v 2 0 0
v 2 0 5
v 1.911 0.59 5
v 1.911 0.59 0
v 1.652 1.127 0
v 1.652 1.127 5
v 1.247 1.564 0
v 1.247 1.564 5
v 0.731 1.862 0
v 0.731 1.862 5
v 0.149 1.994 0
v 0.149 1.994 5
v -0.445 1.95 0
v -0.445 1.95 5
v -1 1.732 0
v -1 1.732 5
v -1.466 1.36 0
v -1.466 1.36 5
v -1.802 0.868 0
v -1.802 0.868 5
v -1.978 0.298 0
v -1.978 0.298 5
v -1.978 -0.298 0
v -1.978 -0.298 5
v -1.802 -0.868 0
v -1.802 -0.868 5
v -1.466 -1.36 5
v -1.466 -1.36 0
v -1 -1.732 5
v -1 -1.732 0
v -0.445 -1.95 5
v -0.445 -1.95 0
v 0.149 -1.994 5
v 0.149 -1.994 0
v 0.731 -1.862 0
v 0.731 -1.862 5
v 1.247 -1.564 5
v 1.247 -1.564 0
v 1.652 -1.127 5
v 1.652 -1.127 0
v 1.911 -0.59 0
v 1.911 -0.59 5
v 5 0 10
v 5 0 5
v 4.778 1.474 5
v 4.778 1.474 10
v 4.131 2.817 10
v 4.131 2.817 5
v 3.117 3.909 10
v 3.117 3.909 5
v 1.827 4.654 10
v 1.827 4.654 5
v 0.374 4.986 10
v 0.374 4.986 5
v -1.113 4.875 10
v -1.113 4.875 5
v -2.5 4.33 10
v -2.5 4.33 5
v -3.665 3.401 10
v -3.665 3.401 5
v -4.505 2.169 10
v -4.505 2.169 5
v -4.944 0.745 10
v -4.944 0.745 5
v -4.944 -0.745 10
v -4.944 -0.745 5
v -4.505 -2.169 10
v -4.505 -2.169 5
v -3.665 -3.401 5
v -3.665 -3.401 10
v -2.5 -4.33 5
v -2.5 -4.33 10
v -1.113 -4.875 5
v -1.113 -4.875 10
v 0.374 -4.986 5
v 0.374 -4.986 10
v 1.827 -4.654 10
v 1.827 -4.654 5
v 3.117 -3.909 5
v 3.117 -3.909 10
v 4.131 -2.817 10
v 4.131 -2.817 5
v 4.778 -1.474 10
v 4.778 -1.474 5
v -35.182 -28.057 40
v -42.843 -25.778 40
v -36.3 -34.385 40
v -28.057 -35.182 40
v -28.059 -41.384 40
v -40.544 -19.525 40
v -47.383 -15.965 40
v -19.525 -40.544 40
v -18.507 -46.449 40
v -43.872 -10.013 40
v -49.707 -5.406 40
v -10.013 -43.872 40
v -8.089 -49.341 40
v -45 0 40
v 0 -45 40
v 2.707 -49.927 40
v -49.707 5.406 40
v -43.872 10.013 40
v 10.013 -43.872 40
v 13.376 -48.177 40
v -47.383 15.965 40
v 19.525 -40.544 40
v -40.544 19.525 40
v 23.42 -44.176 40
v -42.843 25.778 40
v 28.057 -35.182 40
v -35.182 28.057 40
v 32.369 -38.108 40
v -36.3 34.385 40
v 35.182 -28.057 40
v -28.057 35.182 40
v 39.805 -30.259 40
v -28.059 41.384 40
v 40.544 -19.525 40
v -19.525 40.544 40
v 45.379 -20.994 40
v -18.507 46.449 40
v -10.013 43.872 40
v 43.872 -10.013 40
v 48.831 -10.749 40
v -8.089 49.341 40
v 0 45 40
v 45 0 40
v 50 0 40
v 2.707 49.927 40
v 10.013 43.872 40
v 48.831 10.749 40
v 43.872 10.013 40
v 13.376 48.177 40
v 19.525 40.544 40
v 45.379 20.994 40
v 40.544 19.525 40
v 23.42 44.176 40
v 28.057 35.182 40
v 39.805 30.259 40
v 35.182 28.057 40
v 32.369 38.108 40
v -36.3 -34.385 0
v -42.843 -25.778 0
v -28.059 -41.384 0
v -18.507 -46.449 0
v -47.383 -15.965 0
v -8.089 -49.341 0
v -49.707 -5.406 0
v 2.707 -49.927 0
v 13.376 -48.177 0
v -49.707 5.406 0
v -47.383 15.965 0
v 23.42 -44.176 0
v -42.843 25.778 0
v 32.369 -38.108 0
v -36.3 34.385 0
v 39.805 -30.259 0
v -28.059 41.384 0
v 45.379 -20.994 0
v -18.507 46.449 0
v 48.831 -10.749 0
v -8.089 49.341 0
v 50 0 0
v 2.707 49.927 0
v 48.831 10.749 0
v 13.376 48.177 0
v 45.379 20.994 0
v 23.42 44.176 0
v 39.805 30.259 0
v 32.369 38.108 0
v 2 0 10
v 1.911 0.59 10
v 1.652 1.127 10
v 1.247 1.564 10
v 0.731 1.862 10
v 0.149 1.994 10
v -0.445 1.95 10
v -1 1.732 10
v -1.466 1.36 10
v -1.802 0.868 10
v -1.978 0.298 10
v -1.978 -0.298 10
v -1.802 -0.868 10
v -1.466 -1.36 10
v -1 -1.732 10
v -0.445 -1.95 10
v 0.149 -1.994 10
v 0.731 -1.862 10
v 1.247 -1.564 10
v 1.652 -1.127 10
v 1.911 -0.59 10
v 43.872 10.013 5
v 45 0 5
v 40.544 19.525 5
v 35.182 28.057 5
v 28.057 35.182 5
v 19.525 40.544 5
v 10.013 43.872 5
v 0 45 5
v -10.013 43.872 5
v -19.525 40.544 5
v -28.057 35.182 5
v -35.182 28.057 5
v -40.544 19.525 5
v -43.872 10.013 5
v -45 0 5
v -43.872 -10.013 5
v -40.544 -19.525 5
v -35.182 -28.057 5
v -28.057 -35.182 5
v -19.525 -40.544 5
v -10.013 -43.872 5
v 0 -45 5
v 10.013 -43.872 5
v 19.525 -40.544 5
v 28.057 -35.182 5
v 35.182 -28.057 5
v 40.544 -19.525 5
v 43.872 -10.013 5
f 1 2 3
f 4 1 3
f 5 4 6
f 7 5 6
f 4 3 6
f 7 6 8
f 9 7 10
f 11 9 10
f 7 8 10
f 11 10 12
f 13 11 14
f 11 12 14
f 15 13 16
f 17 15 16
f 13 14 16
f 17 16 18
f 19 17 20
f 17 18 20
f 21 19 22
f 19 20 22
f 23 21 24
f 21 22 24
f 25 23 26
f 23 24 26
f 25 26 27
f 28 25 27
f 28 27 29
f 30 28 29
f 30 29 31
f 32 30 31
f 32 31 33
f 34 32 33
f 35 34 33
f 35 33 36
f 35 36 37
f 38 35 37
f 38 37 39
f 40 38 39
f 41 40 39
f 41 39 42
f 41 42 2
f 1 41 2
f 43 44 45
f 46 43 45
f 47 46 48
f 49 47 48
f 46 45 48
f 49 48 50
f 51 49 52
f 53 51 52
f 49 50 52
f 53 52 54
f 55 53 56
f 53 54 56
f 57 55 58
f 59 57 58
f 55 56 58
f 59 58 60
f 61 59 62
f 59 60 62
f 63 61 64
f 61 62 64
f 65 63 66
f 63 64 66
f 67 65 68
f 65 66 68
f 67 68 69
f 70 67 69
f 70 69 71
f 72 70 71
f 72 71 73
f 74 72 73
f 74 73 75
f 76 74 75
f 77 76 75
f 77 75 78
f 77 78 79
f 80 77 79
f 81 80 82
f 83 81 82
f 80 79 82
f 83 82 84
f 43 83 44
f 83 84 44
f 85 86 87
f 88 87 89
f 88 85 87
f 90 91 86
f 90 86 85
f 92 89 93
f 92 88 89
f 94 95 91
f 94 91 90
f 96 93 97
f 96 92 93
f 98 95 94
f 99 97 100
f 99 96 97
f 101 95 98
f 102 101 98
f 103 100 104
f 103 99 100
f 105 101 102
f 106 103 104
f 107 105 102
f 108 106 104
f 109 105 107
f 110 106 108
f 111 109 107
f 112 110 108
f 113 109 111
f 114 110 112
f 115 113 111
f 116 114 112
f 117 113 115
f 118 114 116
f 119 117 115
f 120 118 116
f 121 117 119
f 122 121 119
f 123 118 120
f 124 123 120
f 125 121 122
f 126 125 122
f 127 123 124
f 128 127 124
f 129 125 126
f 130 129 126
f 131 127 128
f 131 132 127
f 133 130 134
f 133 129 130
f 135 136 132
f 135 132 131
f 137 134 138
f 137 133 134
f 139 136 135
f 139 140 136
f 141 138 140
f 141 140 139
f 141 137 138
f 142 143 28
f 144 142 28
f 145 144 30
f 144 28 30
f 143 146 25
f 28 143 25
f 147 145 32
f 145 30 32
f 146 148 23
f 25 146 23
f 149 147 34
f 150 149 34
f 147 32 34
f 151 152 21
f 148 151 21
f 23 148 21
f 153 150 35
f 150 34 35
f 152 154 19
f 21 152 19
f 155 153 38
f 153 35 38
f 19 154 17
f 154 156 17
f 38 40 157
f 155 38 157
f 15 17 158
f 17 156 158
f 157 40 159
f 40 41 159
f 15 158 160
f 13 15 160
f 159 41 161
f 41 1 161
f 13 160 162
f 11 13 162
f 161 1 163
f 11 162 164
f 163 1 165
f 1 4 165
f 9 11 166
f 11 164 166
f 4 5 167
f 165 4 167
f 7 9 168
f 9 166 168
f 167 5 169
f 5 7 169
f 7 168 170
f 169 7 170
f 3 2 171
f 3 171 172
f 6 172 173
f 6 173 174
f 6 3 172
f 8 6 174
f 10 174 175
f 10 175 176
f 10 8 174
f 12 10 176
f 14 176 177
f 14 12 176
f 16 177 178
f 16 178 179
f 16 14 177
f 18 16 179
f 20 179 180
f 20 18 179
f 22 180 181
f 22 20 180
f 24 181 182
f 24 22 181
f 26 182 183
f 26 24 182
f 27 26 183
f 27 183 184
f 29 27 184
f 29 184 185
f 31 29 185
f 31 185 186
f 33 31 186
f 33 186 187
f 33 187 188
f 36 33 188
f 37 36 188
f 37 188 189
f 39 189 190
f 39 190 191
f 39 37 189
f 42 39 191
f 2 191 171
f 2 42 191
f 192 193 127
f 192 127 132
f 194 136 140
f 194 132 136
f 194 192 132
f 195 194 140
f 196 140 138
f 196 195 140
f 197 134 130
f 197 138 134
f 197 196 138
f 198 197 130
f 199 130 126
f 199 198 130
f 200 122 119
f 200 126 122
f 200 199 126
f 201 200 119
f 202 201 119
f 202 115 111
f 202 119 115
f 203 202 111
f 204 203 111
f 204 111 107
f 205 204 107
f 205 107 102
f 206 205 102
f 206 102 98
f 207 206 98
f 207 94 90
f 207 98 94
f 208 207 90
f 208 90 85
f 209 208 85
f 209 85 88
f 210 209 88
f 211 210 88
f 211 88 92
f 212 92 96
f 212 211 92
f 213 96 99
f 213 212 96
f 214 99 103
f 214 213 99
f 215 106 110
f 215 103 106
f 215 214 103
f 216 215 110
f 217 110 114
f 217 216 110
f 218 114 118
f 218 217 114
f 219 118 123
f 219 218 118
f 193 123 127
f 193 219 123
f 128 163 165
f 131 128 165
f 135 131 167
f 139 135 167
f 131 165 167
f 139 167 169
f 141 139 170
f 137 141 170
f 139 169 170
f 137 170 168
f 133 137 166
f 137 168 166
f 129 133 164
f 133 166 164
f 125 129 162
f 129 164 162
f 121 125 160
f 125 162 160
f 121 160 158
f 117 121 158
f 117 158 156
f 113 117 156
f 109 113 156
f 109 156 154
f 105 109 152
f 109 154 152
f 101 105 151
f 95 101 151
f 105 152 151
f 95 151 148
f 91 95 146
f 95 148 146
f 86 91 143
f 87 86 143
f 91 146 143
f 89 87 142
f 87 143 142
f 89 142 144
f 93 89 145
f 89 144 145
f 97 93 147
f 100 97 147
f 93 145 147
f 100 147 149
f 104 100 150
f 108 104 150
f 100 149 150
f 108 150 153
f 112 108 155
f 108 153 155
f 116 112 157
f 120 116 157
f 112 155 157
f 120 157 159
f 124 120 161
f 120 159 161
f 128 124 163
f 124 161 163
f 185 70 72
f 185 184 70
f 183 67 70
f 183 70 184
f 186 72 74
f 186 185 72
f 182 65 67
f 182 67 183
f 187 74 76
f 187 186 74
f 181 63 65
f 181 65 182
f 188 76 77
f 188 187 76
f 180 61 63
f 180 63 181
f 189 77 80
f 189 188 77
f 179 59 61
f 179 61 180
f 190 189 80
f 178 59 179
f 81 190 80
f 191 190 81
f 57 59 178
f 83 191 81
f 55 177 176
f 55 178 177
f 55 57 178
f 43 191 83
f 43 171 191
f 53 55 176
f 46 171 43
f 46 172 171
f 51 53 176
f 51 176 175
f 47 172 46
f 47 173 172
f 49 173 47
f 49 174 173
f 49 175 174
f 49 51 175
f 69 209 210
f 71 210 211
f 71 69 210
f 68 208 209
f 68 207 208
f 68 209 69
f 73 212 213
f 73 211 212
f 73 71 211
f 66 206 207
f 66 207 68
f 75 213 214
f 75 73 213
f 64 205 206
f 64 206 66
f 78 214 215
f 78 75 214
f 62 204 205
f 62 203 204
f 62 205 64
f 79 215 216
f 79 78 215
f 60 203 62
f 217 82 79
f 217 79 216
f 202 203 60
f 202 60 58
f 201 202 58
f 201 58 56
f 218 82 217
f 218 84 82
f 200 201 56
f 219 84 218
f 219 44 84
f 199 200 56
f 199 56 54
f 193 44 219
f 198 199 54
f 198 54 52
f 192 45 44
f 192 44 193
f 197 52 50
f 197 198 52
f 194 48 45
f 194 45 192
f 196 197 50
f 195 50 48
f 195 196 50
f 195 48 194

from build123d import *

# Parameters (mm, degrees)
SKETCH1_R               = 50
BOSS_EXTRUDE1_DEPTH     = 40
SHELL1_T                = -5
SKETCH2_R               = 2
CUT_EXTRUDE1_DEPTH      = 79.89866919
CUT_EXTRUDE1_DEPTH_BACK = 79.89866919
SKETCH3_R               = 5
SKETCH3_R_2             = 2
BOSS_EXTRUDE2_DEPTH     = 5


with BuildPart() as part:
    # Sketch1 → Boss-Extrude1 (new body)
    with BuildSketch(Plane.XY):
        Circle(SKETCH1_R)
    extrude(amount=BOSS_EXTRUDE1_DEPTH)

    # Shell1
    shell1_openings = [part.faces().sort_by_distance(p)[0] for p in [
        (0, 0, 40),
    ]]
    offset(amount=SHELL1_T, openings=shell1_openings, kind=Kind.INTERSECTION)

    # Sketch2 → Cut-Extrude1 (cut, two sides)
    with BuildSketch(Plane.XY.offset(5)) as cut_extrude1_sk:
        Circle(SKETCH2_R)
    extrude(amount=CUT_EXTRUDE1_DEPTH, mode=Mode.SUBTRACT)
    extrude(cut_extrude1_sk.sketch, amount=-CUT_EXTRUDE1_DEPTH_BACK, mode=Mode.SUBTRACT)

    # Sketch3 → Boss-Extrude2 (add)
    with BuildSketch(Plane.XY.offset(5)):
        Circle(SKETCH3_R)
        Circle(SKETCH3_R_2, mode=Mode.SUBTRACT)
    extrude(amount=BOSS_EXTRUDE2_DEPTH)


solid = part.part
